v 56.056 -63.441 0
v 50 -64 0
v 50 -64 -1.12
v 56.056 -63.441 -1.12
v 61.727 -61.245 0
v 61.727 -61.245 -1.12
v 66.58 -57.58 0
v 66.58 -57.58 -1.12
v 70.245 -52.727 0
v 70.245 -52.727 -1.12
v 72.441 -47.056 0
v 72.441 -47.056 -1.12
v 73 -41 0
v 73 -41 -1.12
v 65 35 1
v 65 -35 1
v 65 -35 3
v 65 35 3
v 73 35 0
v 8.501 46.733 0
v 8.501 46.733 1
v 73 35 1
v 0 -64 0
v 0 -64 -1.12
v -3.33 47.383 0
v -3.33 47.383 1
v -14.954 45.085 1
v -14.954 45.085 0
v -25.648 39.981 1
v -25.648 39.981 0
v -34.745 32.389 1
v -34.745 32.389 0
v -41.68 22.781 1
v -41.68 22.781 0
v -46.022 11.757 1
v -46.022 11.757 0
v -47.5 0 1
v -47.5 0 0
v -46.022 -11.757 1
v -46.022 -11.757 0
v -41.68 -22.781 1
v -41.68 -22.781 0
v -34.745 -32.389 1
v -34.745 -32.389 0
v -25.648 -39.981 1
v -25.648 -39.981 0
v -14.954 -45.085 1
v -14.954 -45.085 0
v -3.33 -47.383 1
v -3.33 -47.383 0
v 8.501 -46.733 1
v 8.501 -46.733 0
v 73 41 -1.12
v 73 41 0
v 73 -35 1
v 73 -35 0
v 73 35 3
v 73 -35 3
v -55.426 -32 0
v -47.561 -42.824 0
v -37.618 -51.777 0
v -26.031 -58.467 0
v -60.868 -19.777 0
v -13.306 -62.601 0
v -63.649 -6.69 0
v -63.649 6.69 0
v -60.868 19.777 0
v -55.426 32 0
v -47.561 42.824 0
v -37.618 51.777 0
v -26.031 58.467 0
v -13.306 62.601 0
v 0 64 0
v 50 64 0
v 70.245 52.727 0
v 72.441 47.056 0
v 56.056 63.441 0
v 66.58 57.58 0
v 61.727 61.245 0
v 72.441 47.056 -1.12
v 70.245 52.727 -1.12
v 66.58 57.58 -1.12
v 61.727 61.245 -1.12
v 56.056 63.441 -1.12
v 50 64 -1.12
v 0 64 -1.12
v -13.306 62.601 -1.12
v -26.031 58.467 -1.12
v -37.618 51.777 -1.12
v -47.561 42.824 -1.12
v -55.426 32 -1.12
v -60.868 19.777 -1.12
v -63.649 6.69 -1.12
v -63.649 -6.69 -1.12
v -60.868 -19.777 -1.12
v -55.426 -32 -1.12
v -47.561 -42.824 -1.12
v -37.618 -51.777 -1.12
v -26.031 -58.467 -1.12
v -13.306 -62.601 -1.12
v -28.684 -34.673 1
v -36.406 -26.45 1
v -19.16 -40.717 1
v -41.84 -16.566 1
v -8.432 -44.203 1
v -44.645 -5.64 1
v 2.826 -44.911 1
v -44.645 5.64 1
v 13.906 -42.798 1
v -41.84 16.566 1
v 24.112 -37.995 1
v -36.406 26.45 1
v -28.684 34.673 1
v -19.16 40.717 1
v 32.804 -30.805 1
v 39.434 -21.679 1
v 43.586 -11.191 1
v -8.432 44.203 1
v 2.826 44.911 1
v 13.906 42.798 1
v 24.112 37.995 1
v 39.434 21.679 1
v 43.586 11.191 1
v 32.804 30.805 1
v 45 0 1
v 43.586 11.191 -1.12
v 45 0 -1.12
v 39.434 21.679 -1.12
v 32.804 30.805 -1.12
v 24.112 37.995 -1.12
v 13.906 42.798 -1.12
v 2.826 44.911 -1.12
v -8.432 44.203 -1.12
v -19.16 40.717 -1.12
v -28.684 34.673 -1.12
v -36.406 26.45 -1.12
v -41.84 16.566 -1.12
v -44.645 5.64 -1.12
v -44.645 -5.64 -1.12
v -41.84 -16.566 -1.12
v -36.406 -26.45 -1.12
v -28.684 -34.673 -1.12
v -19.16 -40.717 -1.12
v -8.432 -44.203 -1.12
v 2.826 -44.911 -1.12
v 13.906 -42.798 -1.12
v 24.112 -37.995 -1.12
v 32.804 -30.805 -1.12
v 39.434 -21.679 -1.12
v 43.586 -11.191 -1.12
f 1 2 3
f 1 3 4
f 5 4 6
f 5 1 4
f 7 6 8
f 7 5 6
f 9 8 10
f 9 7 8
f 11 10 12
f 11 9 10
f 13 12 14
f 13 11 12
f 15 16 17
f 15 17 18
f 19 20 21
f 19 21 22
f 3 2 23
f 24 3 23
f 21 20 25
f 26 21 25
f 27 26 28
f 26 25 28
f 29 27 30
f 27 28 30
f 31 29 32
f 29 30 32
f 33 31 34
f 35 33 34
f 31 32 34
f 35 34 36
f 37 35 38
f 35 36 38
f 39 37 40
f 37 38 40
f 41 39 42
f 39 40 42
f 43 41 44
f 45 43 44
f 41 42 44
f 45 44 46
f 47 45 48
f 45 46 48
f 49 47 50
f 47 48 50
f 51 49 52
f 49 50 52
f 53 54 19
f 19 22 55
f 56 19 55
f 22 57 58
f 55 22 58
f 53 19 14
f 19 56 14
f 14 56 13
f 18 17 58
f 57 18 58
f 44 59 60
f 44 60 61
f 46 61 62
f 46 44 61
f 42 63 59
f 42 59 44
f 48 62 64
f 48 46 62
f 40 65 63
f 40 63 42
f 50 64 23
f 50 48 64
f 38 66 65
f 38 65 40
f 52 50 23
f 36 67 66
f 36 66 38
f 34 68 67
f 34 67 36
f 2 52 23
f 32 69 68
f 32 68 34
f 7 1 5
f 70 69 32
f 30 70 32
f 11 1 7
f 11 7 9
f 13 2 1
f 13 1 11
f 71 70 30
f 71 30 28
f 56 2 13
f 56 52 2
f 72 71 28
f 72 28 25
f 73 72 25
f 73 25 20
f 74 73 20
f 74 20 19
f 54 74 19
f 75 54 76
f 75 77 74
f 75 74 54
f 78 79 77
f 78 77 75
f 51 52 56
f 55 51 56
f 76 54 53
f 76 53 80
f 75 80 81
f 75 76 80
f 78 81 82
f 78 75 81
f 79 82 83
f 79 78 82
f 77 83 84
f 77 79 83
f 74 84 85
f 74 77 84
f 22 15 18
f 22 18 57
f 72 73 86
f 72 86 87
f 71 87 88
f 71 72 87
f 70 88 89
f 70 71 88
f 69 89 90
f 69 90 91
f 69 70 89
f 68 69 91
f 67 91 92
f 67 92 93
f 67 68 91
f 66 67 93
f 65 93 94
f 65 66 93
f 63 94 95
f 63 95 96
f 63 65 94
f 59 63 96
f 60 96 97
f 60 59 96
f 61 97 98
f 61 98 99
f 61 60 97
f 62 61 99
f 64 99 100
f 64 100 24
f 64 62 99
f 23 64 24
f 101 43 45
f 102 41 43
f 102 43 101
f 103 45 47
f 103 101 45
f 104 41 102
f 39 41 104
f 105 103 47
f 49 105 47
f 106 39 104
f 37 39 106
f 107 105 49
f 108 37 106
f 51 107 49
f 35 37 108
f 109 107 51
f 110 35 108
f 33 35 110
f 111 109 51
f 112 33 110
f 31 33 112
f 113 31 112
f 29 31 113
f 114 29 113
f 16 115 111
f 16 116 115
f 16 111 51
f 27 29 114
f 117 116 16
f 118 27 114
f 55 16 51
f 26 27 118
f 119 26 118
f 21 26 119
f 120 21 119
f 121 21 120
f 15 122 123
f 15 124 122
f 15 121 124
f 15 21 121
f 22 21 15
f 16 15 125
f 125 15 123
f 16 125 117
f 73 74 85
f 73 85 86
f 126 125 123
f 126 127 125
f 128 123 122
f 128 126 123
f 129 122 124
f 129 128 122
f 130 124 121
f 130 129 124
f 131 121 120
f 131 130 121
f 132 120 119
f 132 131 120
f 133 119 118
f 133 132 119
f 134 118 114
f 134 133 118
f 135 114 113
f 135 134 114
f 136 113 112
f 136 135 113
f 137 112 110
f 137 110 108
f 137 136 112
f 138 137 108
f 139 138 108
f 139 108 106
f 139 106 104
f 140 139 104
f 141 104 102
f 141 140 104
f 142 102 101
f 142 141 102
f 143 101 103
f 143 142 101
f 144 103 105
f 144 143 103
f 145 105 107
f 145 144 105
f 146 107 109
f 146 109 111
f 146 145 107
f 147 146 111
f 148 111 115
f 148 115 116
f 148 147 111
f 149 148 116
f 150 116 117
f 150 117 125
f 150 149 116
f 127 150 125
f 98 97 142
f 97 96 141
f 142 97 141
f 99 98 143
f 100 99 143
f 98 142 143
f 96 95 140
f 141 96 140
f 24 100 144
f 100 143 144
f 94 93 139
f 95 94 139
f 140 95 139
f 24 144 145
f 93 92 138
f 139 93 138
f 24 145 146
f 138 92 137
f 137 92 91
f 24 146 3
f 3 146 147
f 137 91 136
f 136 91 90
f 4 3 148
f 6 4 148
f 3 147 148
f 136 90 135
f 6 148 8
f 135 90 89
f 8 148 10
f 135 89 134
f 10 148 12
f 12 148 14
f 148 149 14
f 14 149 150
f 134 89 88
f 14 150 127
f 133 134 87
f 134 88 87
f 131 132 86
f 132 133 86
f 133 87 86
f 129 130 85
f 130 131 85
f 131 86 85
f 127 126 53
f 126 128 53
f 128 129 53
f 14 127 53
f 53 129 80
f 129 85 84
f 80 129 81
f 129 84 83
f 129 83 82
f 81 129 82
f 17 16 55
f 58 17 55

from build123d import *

# Parameters (mm, degrees)
SKETCH001_R  = 45
PAD_DEPTH    = 1.12
SKETCH_W     = 8
SKETCH_H     = 70
PAD003_DEPTH = 3
SKETCH024_R  = 45
PAD006_DEPTH = 1


with BuildPart() as part:
    # Sketch001 → Pad (new body)
    with BuildSketch(Plane.XY):
        with BuildLine():
            Line((50, 64), (0, 64))
            ThreePointArc((0, 64), (-64.000064, 0), (0, -64))
            Line((50, -64), (0, -64))
            ThreePointArc((50, -64), (66.580186, -57.580186), (73, -41))
            Line((73, 41), (73, -41))
            ThreePointArc((73, 41), (66.580186, 57.580186), (50, 64))
        make_face()
        Circle(SKETCH001_R, mode=Mode.SUBTRACT)
    extrude(amount=-PAD_DEPTH)

    # Sketch → Pad003 (new body)
    with BuildSketch(Plane.XY):
        with Locations((69, 0)):
            Rectangle(SKETCH_W, SKETCH_H)
    extrude(amount=PAD003_DEPTH)

    # Sketch024 → Pad006 (new body)
    with BuildSketch(Plane.XY):
        with BuildLine():
            ThreePointArc((8.501021, 46.7331), (-47.5, 0), (8.501021, -46.7331))
            Line((8.501021, -46.7331), (73, -35))
            Line((73, 35), (73, -35))
            Line((8.501021, 46.7331), (73, 35))
        make_face()
        Circle(SKETCH024_R, mode=Mode.SUBTRACT)
    extrude(amount=PAD006_DEPTH)


solid = part.part
